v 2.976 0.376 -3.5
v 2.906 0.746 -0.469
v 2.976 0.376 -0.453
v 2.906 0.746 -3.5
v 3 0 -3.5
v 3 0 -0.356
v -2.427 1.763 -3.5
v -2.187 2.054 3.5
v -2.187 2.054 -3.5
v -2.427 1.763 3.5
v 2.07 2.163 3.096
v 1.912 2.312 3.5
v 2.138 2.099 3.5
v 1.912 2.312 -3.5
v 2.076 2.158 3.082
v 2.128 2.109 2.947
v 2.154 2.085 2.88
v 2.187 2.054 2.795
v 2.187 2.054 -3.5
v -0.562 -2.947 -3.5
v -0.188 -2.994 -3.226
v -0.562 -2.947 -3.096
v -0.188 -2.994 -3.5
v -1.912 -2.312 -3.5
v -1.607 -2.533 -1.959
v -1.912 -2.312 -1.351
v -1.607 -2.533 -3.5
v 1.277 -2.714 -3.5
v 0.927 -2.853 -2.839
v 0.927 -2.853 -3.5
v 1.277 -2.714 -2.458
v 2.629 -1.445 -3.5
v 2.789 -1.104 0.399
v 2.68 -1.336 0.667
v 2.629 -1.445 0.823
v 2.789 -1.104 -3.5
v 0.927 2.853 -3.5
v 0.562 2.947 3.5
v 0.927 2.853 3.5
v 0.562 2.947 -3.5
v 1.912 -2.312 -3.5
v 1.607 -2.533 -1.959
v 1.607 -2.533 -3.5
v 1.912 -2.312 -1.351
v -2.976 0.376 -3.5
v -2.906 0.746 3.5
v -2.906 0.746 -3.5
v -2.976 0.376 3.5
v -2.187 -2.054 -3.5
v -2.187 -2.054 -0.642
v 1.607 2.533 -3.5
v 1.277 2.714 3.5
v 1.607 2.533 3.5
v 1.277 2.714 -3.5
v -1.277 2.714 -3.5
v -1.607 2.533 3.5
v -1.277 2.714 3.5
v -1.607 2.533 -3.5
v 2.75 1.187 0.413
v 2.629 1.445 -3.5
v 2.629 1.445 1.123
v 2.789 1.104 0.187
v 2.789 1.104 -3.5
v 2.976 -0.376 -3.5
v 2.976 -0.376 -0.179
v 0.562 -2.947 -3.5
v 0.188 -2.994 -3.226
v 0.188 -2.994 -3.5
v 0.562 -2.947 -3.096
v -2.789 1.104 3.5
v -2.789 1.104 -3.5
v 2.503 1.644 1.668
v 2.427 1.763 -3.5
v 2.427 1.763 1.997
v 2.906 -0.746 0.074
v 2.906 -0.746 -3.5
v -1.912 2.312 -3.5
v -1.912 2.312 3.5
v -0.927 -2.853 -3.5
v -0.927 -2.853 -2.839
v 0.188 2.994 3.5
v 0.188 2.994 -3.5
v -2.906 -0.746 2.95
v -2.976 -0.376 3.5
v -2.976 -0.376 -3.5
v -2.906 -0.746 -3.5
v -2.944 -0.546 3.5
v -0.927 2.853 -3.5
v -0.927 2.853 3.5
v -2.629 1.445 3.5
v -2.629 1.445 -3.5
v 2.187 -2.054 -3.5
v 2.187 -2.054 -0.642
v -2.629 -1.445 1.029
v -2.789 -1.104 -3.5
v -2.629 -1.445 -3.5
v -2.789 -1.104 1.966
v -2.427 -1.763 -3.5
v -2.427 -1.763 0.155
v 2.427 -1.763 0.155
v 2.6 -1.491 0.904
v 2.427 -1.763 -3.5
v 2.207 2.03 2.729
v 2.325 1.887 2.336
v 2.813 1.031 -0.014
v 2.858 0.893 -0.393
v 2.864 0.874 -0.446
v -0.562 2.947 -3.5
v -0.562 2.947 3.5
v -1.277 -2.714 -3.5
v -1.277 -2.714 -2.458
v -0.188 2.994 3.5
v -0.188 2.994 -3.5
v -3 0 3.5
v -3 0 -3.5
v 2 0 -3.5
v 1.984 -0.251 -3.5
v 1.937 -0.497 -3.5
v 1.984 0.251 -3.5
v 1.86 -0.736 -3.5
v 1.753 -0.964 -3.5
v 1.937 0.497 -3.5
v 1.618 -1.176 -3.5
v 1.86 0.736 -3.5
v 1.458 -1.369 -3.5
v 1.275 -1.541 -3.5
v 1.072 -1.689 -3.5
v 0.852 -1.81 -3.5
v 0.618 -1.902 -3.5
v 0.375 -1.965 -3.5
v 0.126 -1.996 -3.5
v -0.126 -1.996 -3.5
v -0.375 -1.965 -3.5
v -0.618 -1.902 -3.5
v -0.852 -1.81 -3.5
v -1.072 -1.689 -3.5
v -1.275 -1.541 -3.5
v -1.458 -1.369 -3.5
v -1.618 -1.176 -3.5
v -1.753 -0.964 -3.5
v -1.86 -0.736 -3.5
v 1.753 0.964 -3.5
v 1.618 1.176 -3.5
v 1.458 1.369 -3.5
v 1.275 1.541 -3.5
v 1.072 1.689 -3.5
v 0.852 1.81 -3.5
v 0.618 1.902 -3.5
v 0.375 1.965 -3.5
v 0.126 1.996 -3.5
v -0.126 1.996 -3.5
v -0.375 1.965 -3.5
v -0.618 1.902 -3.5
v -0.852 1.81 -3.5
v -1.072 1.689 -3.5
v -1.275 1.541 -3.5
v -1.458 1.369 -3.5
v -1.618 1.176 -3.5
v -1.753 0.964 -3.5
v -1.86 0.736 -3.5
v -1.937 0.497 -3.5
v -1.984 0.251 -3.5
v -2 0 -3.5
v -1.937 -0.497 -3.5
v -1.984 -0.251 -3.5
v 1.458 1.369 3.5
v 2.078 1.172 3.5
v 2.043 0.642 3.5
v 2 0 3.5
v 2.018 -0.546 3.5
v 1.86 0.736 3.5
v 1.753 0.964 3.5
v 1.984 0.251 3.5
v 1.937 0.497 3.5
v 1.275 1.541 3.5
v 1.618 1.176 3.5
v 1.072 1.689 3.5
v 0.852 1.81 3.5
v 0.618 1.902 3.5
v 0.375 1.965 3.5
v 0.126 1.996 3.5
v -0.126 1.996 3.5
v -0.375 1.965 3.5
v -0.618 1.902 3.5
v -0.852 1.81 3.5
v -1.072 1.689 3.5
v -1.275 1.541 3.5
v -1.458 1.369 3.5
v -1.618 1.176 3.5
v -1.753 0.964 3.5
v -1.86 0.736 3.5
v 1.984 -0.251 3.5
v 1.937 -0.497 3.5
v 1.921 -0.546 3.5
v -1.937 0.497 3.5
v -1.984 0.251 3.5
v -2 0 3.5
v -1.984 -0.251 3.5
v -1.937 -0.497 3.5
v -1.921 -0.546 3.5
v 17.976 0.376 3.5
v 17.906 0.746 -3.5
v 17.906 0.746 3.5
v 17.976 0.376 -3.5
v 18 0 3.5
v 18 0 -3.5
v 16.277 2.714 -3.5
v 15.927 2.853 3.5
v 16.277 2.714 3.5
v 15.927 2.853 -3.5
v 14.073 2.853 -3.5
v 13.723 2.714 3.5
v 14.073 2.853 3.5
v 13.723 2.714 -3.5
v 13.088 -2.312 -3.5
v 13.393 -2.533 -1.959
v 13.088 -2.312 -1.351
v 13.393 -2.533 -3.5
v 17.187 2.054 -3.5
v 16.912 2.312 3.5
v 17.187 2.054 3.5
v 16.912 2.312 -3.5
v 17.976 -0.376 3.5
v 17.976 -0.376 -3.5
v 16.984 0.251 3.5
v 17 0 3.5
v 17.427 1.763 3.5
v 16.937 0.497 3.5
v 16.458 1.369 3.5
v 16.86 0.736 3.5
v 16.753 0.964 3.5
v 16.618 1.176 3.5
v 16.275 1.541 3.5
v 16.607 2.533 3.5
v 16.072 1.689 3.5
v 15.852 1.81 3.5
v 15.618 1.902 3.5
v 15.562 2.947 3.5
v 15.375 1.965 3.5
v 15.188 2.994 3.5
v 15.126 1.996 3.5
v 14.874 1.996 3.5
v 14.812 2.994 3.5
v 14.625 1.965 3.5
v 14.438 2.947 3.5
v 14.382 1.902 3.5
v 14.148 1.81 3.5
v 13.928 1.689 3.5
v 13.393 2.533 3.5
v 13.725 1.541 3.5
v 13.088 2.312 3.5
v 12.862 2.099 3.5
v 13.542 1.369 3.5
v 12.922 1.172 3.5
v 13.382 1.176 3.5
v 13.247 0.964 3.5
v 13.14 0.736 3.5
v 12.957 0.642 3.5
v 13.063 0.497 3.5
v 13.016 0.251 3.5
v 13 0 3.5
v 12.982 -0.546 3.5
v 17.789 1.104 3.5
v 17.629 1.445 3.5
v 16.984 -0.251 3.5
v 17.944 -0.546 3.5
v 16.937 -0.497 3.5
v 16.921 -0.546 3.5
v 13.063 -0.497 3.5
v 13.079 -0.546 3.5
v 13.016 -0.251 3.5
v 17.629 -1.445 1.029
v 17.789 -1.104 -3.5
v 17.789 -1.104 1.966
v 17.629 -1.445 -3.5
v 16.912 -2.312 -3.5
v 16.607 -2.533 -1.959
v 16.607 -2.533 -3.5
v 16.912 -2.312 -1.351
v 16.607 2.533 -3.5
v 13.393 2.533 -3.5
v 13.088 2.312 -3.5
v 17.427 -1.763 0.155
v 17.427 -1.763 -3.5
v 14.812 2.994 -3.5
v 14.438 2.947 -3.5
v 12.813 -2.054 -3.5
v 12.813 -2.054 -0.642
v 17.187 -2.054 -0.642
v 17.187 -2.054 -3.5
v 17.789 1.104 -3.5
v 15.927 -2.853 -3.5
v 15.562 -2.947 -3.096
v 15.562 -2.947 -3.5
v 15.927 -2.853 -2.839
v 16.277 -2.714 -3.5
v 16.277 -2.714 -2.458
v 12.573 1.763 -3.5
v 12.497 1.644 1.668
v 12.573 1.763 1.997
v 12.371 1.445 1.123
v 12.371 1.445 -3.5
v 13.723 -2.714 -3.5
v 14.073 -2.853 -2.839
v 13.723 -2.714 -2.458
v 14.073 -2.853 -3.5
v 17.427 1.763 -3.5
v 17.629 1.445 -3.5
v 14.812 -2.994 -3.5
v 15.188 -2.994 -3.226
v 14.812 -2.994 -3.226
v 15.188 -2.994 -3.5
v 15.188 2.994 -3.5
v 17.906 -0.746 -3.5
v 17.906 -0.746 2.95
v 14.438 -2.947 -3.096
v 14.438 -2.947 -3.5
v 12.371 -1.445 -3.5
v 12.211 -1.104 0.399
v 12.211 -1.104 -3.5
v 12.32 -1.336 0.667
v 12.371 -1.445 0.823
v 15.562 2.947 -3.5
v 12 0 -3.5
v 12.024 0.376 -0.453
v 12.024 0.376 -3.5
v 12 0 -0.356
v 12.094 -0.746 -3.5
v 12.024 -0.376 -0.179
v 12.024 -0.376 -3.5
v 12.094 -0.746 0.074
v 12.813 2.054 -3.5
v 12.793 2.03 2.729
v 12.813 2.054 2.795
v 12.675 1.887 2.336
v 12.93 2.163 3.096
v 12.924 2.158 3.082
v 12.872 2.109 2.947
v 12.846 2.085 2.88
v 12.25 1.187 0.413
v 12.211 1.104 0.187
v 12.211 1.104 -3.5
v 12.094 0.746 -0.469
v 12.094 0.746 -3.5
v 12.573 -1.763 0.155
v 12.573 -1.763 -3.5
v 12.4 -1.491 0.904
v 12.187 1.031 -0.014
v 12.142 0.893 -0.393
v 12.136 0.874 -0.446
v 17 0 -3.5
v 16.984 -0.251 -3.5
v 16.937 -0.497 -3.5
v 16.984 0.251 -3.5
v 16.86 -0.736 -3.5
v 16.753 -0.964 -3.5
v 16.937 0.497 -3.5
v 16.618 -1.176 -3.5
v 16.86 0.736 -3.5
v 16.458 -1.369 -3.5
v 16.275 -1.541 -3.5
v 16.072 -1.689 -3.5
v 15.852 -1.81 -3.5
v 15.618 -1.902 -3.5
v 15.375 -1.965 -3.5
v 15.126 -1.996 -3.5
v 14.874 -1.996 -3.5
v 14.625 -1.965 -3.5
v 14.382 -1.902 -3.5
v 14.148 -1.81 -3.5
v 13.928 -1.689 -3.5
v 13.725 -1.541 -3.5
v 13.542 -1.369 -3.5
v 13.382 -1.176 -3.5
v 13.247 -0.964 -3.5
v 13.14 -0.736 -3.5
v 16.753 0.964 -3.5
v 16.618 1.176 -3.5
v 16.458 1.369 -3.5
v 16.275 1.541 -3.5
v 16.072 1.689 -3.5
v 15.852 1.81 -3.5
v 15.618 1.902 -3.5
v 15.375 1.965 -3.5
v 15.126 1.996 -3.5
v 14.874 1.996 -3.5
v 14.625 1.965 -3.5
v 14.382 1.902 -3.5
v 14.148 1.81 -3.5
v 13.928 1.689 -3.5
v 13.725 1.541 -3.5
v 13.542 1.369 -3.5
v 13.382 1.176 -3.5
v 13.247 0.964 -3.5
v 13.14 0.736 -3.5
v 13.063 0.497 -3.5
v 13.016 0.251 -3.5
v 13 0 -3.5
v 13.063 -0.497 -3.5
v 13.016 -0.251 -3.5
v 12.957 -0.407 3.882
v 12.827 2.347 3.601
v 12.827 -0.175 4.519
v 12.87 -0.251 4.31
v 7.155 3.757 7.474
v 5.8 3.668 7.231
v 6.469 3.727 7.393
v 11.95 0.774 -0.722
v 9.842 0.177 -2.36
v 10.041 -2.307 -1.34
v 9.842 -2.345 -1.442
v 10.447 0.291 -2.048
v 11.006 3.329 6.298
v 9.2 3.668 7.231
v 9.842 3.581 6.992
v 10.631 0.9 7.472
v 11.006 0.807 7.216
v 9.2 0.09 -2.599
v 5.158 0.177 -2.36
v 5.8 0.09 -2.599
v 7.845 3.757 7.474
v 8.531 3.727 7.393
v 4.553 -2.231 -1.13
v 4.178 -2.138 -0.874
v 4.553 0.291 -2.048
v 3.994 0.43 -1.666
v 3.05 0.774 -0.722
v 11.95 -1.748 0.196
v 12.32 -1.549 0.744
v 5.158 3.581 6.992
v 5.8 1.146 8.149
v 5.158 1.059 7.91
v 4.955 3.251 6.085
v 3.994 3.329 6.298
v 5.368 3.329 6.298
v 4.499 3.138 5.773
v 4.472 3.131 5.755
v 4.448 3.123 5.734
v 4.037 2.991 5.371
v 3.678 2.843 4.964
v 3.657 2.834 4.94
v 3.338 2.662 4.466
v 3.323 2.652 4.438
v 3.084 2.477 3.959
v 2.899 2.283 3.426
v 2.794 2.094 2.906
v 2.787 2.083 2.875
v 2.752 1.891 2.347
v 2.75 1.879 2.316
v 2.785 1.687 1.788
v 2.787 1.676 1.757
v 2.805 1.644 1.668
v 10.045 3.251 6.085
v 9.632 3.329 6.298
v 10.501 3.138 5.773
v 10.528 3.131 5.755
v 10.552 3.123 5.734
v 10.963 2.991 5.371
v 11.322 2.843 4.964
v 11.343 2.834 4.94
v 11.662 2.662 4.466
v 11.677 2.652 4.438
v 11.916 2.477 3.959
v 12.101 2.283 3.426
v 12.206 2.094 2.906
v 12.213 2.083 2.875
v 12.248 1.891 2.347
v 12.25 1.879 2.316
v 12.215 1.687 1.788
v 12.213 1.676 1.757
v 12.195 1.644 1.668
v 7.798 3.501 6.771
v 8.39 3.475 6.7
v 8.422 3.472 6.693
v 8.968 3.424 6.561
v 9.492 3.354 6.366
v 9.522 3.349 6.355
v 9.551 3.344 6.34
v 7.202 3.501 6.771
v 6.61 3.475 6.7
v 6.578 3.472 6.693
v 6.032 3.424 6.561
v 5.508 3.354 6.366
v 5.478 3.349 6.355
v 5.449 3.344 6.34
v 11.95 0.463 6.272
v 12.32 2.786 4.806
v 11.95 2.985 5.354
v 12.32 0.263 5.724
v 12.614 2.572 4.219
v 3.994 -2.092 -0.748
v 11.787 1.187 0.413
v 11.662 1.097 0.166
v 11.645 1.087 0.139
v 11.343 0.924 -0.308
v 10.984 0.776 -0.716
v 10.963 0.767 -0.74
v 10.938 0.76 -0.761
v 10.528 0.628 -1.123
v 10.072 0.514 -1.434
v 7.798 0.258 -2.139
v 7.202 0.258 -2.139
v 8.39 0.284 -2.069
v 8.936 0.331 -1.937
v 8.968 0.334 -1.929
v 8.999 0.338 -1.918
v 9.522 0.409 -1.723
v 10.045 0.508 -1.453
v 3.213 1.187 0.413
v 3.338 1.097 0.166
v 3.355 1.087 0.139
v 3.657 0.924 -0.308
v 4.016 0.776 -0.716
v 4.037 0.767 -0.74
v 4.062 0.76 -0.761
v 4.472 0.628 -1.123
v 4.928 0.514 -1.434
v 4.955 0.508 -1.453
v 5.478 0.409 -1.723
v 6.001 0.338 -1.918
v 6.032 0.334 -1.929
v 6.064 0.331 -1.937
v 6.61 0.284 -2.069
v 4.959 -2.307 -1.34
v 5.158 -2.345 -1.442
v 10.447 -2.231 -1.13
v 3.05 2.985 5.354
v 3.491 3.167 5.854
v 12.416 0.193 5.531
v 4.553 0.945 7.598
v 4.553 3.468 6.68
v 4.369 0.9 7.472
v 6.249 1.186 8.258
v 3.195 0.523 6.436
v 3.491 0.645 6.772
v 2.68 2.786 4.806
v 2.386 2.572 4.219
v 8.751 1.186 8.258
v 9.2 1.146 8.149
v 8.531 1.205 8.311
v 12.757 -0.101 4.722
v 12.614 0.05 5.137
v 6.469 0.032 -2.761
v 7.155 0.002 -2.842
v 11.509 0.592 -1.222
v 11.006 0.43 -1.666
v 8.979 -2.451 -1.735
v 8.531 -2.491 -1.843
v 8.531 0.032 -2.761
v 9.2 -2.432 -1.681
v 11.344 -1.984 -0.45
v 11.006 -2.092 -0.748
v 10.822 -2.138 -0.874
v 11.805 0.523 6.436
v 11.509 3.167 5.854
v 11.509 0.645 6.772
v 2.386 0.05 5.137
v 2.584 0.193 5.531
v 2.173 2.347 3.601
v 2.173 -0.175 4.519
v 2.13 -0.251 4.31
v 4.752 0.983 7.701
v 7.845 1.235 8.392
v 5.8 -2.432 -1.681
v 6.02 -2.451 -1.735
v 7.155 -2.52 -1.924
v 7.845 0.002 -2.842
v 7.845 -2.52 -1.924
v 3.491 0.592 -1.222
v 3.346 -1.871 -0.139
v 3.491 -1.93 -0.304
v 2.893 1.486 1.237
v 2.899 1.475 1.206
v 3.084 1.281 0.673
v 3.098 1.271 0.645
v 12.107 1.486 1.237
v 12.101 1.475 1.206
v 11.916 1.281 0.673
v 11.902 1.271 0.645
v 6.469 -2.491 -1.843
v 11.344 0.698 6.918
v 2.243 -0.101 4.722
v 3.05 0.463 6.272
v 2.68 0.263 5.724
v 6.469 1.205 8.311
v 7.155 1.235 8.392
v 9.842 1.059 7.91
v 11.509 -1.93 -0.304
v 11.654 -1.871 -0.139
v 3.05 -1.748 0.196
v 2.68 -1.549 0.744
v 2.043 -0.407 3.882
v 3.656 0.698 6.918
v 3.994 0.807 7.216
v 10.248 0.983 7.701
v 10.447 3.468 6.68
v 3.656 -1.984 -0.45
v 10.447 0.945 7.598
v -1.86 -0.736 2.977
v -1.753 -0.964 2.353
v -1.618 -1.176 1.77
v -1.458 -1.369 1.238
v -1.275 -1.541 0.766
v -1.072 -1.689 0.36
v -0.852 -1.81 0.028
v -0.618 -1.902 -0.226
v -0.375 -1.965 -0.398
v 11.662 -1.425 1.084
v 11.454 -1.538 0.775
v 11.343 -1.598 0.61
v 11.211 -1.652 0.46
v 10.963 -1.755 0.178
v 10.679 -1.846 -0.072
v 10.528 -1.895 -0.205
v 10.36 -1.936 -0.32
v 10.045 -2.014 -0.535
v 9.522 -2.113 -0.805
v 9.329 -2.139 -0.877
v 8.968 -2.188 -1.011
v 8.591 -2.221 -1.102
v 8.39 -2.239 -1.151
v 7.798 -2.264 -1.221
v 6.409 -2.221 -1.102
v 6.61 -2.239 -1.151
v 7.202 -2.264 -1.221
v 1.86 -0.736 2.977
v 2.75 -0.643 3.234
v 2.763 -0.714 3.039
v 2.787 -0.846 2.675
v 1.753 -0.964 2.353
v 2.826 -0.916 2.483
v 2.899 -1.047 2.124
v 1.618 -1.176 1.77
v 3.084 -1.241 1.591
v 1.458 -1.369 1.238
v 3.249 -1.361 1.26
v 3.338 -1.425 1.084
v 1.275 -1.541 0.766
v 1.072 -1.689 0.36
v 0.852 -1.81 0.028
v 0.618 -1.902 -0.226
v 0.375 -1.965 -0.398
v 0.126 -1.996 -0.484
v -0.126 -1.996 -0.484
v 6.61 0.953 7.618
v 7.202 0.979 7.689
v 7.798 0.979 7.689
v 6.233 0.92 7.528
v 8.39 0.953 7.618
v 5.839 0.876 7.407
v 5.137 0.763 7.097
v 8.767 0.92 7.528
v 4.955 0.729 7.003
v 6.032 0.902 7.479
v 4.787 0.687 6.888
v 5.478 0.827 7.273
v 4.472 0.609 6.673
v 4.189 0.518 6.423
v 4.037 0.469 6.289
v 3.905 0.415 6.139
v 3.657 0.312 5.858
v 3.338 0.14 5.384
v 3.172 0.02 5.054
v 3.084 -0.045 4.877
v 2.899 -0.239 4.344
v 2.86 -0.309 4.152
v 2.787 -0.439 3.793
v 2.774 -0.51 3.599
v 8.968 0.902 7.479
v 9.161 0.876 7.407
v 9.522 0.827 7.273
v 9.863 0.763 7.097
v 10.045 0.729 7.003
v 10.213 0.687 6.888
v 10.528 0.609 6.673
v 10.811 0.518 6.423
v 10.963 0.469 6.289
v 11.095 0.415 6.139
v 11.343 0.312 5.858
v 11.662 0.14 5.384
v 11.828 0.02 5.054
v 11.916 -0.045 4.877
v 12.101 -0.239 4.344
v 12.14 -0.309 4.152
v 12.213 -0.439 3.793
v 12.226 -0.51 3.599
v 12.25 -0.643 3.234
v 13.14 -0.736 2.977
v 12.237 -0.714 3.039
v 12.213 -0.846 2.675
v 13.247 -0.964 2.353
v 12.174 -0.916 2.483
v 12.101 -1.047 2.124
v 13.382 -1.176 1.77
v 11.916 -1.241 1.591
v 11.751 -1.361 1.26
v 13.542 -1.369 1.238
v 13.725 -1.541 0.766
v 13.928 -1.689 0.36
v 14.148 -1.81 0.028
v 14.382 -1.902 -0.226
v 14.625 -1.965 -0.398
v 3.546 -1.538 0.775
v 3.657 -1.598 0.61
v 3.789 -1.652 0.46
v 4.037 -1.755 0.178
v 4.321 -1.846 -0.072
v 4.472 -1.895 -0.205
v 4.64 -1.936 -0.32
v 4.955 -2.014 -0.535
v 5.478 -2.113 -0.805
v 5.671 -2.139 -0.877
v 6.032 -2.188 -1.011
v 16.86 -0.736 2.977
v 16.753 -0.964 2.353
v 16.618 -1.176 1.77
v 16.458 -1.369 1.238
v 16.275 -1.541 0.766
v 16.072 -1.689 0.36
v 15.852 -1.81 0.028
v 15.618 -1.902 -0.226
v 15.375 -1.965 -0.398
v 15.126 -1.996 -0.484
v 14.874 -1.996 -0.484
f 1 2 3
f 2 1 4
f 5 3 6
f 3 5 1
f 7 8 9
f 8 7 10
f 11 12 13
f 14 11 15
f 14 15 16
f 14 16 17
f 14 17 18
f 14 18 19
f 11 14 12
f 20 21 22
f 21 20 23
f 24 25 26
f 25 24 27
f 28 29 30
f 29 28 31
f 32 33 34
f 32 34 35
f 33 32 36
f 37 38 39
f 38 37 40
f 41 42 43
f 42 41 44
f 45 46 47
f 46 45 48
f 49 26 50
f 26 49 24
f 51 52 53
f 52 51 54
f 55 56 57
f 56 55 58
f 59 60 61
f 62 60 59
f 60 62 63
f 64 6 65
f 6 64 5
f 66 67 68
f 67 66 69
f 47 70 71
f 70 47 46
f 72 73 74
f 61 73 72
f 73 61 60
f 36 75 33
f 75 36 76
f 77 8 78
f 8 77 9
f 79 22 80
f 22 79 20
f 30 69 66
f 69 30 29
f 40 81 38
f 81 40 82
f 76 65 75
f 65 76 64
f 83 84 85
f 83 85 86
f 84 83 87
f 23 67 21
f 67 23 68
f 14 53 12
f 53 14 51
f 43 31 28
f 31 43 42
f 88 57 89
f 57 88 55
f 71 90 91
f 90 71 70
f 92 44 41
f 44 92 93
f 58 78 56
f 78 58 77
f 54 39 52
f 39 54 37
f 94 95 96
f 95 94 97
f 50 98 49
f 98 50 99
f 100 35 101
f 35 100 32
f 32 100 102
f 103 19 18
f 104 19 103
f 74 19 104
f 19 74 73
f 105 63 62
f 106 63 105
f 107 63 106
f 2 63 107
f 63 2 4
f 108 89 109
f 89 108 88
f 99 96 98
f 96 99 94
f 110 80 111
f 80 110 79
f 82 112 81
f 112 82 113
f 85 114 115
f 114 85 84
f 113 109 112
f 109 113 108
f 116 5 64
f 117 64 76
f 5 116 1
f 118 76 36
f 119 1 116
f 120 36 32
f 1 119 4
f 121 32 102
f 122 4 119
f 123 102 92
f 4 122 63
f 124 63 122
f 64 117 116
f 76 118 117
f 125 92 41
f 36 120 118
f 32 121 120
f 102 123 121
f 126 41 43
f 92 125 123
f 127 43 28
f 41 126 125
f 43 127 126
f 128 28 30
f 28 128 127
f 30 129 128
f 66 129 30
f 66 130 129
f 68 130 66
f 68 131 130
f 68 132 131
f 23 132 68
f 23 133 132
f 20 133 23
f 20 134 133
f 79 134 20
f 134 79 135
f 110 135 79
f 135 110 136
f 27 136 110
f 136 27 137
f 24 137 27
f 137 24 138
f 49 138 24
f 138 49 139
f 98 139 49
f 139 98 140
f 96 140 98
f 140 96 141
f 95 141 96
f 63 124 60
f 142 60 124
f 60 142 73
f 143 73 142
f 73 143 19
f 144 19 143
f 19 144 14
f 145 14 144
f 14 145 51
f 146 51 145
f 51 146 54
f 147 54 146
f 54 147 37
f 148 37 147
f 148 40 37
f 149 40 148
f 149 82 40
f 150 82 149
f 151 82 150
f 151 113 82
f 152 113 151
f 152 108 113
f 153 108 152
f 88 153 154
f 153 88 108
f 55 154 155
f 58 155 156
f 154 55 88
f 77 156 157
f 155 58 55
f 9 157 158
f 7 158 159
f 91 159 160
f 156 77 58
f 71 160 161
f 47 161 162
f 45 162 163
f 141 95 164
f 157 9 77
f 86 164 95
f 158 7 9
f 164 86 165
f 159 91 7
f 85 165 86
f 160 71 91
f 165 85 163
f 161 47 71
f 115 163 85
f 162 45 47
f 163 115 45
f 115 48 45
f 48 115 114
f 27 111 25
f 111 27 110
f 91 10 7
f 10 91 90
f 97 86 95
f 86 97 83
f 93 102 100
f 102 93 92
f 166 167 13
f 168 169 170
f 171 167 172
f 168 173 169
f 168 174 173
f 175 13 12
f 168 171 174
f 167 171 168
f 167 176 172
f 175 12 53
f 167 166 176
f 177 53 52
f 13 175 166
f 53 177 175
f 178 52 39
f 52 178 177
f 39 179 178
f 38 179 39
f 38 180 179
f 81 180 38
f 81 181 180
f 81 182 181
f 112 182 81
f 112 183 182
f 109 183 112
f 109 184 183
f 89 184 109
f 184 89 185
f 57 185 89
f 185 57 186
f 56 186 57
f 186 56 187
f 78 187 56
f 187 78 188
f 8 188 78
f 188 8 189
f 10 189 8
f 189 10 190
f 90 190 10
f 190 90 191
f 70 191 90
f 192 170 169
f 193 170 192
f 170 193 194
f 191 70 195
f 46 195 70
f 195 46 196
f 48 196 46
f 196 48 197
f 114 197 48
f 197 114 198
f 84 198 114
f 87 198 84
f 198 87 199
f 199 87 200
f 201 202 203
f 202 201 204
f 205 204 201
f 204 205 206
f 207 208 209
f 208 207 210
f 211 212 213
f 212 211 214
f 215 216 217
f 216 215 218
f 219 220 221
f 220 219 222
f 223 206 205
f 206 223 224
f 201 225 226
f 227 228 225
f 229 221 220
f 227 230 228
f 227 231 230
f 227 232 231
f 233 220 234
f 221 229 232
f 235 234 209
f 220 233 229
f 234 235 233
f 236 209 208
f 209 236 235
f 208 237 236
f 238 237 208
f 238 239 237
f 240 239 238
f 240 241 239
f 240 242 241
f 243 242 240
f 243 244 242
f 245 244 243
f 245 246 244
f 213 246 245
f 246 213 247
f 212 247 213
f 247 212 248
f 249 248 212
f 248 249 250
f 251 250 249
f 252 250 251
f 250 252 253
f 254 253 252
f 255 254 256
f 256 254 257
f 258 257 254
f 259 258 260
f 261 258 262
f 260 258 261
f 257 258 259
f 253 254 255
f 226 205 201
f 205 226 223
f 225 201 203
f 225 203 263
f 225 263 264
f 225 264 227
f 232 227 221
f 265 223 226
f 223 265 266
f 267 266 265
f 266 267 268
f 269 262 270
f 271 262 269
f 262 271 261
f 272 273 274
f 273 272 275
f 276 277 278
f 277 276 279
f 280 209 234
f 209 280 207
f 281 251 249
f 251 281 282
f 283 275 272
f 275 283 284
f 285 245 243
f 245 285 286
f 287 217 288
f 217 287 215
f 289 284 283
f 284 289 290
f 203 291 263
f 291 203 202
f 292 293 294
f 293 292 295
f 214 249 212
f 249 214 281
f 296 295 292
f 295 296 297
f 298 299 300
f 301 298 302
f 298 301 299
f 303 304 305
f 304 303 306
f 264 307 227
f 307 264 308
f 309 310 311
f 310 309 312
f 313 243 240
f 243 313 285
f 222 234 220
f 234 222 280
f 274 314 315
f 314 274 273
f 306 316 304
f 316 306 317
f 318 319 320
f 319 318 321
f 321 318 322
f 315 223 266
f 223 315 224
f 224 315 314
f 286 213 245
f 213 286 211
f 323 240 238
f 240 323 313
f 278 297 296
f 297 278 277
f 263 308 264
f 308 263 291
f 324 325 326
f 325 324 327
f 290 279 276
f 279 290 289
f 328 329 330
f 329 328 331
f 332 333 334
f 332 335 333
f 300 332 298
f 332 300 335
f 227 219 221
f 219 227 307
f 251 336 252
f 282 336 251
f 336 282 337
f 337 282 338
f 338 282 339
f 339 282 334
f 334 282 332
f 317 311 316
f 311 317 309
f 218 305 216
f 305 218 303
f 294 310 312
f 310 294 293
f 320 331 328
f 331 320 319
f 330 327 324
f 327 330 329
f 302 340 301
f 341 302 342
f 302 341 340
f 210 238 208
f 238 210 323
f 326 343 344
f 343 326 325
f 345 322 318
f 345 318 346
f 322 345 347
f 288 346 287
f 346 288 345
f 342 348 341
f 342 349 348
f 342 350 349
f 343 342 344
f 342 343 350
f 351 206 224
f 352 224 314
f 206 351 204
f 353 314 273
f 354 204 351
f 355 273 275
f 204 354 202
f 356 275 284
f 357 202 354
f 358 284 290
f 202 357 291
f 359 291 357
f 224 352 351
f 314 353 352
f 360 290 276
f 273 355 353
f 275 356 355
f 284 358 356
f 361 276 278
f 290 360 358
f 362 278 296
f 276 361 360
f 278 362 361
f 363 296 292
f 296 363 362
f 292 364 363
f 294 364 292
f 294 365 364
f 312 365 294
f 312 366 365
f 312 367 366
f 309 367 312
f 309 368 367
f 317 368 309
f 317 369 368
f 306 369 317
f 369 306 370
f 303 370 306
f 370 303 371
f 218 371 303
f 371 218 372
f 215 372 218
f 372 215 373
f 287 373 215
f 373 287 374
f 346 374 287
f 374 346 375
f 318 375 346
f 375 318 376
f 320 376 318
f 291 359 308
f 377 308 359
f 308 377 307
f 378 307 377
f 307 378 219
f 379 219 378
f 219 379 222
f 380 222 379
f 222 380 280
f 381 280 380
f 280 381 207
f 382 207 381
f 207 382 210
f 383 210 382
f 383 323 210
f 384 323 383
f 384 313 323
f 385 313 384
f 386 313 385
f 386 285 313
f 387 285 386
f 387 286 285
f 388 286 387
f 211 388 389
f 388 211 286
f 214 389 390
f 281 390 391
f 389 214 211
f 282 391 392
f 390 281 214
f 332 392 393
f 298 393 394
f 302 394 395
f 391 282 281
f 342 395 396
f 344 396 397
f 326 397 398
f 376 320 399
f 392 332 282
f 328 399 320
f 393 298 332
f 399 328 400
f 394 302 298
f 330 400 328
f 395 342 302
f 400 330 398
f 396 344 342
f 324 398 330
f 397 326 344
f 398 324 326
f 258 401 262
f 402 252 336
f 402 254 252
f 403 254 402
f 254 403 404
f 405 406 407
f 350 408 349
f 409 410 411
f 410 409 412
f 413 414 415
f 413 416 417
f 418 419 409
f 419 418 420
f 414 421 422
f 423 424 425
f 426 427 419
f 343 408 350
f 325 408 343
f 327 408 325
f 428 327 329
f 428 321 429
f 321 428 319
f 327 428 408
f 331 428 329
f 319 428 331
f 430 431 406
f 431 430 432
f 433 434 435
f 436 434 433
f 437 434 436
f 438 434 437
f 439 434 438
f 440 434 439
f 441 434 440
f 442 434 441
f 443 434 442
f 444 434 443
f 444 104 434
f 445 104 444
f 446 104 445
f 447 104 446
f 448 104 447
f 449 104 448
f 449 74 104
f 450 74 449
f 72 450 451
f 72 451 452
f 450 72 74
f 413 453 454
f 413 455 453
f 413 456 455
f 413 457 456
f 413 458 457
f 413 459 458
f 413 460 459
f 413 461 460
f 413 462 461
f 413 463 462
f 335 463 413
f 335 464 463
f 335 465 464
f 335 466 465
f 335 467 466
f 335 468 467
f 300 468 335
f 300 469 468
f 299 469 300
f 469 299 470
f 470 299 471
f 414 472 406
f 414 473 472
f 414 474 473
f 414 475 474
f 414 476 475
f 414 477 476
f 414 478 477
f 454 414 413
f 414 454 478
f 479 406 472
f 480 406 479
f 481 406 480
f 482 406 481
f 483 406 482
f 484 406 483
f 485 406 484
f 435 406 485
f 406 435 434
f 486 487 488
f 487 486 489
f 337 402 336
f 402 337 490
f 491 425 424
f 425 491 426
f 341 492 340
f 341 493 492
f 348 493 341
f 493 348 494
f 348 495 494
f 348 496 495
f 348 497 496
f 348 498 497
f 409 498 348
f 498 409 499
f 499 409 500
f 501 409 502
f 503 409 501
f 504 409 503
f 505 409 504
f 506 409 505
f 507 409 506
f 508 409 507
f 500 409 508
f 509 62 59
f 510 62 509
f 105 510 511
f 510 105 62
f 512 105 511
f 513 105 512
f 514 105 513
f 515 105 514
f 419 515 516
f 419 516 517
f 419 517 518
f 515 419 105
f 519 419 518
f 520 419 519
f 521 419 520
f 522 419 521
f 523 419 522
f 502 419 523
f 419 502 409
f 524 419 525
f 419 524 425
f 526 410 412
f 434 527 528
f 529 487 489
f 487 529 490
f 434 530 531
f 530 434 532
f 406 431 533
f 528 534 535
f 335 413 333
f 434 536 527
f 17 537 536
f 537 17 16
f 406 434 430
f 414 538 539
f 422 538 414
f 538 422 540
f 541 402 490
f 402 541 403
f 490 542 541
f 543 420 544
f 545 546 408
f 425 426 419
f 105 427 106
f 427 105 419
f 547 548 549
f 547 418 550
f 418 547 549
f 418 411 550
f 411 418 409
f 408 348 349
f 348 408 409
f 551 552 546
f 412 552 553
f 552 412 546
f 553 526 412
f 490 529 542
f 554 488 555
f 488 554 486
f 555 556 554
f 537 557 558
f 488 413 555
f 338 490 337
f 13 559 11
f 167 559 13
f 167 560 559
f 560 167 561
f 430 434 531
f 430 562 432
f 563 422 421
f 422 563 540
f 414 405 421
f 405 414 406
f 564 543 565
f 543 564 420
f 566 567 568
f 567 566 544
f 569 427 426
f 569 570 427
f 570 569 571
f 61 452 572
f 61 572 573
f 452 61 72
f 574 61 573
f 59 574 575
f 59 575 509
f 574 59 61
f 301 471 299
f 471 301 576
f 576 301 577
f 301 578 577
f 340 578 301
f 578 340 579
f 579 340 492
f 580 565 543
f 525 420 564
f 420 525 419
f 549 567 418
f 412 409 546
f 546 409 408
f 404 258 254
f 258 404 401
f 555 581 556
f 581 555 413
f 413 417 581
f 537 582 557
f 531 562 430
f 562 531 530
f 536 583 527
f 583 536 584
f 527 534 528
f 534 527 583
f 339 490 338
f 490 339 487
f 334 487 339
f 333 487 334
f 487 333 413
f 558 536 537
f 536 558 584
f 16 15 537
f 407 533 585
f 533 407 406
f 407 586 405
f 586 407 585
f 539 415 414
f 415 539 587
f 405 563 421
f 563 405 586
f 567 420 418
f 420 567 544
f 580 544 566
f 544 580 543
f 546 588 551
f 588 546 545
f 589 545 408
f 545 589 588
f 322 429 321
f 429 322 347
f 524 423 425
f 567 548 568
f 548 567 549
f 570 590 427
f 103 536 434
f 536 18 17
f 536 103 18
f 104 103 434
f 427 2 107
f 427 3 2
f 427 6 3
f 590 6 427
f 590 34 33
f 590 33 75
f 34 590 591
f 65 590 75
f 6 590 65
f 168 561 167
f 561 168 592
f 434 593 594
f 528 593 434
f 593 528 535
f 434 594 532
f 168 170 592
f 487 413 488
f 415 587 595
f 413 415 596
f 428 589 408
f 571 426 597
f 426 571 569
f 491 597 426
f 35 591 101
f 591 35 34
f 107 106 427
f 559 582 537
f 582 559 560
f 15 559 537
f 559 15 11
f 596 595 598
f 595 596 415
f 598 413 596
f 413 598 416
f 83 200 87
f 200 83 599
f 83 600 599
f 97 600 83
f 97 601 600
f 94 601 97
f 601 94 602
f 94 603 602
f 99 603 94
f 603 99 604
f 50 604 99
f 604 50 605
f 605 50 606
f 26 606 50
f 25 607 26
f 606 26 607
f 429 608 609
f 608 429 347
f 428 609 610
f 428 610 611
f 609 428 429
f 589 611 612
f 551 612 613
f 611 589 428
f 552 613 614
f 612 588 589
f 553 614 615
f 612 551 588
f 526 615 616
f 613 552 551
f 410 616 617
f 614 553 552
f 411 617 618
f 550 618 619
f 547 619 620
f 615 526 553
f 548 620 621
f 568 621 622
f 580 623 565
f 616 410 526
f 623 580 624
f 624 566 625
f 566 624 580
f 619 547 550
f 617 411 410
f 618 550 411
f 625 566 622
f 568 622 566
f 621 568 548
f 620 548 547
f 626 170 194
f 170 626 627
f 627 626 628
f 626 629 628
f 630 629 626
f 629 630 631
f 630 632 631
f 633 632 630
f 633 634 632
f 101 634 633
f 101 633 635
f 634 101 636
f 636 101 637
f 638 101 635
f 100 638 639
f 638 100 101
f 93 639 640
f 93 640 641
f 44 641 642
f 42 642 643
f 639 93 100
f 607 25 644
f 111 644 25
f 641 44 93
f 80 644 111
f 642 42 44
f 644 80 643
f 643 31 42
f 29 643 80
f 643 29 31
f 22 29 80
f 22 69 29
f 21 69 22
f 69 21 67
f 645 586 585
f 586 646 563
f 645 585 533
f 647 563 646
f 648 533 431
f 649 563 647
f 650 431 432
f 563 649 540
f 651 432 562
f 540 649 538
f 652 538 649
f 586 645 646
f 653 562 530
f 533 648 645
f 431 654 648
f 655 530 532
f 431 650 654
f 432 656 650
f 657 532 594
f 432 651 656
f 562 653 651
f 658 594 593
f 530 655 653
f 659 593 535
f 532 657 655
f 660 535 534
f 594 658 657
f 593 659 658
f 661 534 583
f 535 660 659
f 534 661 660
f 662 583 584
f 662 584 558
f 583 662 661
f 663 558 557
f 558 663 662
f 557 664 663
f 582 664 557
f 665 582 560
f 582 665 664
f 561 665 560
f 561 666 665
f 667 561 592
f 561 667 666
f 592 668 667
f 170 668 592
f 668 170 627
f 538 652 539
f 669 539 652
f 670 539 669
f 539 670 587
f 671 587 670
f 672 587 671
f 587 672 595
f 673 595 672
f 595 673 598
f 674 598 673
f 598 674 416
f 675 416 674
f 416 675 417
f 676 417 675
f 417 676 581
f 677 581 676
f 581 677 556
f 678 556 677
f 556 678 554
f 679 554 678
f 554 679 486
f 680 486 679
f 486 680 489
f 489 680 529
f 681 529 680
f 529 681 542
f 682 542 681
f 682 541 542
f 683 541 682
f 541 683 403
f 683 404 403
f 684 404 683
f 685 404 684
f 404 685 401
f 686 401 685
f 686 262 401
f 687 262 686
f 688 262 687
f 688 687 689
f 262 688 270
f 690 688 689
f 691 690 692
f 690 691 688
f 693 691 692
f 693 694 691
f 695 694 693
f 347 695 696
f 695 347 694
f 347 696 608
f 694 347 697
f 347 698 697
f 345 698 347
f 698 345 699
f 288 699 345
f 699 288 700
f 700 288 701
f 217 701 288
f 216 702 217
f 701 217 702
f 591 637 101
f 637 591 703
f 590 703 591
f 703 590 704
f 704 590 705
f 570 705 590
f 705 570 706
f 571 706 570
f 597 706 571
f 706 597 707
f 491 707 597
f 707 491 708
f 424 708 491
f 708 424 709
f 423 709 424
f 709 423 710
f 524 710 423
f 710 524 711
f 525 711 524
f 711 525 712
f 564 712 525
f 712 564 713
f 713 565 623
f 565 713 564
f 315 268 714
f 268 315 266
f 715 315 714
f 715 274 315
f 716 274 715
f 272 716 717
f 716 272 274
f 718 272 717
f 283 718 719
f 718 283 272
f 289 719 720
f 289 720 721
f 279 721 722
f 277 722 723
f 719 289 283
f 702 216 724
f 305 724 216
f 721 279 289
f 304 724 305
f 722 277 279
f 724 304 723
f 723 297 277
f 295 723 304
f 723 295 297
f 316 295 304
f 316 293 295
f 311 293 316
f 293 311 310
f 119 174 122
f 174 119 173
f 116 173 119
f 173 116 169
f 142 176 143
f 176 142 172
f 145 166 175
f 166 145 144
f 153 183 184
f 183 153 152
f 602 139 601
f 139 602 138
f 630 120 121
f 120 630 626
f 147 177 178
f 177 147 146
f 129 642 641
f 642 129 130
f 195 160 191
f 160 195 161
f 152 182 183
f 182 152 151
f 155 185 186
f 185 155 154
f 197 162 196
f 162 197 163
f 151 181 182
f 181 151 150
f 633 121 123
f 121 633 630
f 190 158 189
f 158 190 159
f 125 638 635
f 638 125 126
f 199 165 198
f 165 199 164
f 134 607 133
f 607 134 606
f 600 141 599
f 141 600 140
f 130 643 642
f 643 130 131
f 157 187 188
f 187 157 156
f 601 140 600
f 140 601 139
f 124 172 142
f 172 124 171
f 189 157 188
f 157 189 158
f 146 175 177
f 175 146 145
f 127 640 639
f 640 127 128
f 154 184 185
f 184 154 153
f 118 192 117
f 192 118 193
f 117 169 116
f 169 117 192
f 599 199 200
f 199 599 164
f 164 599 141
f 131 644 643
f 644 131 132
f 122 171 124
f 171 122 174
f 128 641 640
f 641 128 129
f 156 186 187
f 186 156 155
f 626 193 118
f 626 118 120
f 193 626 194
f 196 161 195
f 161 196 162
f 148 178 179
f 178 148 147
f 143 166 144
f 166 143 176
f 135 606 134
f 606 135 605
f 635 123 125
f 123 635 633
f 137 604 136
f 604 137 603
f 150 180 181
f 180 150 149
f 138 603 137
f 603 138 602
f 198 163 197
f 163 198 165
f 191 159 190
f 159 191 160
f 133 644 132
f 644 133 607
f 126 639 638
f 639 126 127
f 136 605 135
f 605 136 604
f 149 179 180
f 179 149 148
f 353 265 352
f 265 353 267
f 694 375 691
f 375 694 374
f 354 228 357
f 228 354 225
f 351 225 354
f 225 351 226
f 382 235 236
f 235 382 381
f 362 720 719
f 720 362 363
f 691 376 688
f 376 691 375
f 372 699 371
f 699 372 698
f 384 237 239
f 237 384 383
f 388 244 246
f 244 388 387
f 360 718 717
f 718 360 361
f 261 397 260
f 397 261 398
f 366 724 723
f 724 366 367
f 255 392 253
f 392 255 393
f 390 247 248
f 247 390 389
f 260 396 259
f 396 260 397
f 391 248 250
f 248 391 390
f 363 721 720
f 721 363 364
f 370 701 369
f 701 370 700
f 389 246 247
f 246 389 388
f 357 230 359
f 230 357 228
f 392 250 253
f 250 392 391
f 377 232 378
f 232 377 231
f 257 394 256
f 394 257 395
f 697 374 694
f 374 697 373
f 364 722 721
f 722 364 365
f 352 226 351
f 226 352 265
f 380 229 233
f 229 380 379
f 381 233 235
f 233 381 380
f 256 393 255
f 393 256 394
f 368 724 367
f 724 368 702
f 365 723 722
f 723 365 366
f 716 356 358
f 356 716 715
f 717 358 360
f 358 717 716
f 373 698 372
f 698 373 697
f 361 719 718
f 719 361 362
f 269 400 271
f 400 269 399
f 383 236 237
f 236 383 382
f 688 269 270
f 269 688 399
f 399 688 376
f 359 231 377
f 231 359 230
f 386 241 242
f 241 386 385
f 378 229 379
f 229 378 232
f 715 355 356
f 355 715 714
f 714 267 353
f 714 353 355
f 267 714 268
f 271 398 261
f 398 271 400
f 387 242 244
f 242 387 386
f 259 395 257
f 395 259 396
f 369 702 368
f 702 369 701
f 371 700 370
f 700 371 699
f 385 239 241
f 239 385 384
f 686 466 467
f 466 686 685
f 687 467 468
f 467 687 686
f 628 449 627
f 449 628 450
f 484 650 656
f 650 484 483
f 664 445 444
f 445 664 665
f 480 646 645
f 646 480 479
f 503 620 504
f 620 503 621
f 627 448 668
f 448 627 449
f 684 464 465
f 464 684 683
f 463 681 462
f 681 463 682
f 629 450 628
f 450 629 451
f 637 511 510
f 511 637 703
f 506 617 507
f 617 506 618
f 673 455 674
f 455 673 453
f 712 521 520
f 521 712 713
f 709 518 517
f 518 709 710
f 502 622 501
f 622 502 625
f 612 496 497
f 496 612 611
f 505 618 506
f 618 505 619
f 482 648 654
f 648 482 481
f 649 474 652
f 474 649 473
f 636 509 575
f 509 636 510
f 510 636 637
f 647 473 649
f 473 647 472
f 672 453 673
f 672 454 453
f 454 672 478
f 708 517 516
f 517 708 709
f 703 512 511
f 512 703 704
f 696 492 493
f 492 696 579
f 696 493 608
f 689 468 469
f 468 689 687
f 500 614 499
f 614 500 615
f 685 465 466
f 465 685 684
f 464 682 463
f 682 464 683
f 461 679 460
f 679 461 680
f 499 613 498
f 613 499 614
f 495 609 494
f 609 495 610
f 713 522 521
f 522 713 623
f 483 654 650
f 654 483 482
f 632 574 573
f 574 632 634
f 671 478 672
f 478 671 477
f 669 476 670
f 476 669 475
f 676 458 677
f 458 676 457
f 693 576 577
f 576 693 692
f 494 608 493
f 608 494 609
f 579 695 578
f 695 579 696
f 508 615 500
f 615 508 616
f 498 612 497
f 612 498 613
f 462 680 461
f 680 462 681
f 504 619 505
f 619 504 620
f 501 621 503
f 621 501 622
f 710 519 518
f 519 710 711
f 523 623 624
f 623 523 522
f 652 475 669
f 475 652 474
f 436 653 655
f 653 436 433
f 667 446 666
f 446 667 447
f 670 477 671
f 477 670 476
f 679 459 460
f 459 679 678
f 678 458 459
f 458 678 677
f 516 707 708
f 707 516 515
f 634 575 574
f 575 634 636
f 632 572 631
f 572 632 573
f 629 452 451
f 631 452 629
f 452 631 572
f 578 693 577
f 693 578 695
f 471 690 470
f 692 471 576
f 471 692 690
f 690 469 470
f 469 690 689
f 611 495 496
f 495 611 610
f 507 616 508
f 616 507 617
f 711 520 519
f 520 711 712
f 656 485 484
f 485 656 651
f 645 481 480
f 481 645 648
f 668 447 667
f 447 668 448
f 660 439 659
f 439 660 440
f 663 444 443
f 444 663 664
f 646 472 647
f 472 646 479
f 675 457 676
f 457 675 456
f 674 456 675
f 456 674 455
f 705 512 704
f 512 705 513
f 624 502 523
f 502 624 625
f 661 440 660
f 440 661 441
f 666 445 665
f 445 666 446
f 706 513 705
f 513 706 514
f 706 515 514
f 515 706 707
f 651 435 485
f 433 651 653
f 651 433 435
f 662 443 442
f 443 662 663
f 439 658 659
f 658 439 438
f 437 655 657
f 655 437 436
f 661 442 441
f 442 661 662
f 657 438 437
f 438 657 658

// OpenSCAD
cam_angle=20;
cam_height=4;
cam_hole=9.5;
cam_offset_y=0;
cam_width=13;

cut=0.5;
cutout_size=30;

$fn=50;

//2s
standoff_height=7;
standoff_width=6;
standoff_hole=4;
standoff_distance=15;
cam_width=11;       //11
cam_offset_z=cam_height*0.5+1;    
total_height=15;




difference() {
    union() {
        //left standoff
        cylinder(d=standoff_width,h=standoff_height,center=true);
        //rightstandoff
        translate([standoff_distance,0,0])
            cylinder(d=standoff_width,h=standoff_height,center=true);
            
        //cam
        translate([standoff_distance*0.5,cam_offset_y,cam_offset_z])
            rotate([90-cam_angle,0,0])
                cylinder(d=cam_width,h=cam_height,center=true);

    }

    union() {
        //cut out angle for printing
        translate([-standoff_width,cam_offset_y,cam_height*0.5+cam_offset_z])
            rotate([90-cam_angle,0,0])
                translate([0,-cutout_size*0.5,0])
                    cube([standoff_distance*2,cutout_size,20],center=false);
        
        //holes
        
        //left standoff
        cylinder(d=standoff_hole,h=standoff_height+cut,center=true);
        
        //right standoff
        translate([standoff_distance,0,0])
            cylinder(d=standoff_hole,h=standoff_height+cut,center=true);
            
        //cam
        translate([standoff_distance*0.5,cam_offset_y,cam_offset_z])
            rotate([90-cam_angle,0,0])
                cylinder(d=cam_hole,h=cam_height+cut,center=true);
    }
}
